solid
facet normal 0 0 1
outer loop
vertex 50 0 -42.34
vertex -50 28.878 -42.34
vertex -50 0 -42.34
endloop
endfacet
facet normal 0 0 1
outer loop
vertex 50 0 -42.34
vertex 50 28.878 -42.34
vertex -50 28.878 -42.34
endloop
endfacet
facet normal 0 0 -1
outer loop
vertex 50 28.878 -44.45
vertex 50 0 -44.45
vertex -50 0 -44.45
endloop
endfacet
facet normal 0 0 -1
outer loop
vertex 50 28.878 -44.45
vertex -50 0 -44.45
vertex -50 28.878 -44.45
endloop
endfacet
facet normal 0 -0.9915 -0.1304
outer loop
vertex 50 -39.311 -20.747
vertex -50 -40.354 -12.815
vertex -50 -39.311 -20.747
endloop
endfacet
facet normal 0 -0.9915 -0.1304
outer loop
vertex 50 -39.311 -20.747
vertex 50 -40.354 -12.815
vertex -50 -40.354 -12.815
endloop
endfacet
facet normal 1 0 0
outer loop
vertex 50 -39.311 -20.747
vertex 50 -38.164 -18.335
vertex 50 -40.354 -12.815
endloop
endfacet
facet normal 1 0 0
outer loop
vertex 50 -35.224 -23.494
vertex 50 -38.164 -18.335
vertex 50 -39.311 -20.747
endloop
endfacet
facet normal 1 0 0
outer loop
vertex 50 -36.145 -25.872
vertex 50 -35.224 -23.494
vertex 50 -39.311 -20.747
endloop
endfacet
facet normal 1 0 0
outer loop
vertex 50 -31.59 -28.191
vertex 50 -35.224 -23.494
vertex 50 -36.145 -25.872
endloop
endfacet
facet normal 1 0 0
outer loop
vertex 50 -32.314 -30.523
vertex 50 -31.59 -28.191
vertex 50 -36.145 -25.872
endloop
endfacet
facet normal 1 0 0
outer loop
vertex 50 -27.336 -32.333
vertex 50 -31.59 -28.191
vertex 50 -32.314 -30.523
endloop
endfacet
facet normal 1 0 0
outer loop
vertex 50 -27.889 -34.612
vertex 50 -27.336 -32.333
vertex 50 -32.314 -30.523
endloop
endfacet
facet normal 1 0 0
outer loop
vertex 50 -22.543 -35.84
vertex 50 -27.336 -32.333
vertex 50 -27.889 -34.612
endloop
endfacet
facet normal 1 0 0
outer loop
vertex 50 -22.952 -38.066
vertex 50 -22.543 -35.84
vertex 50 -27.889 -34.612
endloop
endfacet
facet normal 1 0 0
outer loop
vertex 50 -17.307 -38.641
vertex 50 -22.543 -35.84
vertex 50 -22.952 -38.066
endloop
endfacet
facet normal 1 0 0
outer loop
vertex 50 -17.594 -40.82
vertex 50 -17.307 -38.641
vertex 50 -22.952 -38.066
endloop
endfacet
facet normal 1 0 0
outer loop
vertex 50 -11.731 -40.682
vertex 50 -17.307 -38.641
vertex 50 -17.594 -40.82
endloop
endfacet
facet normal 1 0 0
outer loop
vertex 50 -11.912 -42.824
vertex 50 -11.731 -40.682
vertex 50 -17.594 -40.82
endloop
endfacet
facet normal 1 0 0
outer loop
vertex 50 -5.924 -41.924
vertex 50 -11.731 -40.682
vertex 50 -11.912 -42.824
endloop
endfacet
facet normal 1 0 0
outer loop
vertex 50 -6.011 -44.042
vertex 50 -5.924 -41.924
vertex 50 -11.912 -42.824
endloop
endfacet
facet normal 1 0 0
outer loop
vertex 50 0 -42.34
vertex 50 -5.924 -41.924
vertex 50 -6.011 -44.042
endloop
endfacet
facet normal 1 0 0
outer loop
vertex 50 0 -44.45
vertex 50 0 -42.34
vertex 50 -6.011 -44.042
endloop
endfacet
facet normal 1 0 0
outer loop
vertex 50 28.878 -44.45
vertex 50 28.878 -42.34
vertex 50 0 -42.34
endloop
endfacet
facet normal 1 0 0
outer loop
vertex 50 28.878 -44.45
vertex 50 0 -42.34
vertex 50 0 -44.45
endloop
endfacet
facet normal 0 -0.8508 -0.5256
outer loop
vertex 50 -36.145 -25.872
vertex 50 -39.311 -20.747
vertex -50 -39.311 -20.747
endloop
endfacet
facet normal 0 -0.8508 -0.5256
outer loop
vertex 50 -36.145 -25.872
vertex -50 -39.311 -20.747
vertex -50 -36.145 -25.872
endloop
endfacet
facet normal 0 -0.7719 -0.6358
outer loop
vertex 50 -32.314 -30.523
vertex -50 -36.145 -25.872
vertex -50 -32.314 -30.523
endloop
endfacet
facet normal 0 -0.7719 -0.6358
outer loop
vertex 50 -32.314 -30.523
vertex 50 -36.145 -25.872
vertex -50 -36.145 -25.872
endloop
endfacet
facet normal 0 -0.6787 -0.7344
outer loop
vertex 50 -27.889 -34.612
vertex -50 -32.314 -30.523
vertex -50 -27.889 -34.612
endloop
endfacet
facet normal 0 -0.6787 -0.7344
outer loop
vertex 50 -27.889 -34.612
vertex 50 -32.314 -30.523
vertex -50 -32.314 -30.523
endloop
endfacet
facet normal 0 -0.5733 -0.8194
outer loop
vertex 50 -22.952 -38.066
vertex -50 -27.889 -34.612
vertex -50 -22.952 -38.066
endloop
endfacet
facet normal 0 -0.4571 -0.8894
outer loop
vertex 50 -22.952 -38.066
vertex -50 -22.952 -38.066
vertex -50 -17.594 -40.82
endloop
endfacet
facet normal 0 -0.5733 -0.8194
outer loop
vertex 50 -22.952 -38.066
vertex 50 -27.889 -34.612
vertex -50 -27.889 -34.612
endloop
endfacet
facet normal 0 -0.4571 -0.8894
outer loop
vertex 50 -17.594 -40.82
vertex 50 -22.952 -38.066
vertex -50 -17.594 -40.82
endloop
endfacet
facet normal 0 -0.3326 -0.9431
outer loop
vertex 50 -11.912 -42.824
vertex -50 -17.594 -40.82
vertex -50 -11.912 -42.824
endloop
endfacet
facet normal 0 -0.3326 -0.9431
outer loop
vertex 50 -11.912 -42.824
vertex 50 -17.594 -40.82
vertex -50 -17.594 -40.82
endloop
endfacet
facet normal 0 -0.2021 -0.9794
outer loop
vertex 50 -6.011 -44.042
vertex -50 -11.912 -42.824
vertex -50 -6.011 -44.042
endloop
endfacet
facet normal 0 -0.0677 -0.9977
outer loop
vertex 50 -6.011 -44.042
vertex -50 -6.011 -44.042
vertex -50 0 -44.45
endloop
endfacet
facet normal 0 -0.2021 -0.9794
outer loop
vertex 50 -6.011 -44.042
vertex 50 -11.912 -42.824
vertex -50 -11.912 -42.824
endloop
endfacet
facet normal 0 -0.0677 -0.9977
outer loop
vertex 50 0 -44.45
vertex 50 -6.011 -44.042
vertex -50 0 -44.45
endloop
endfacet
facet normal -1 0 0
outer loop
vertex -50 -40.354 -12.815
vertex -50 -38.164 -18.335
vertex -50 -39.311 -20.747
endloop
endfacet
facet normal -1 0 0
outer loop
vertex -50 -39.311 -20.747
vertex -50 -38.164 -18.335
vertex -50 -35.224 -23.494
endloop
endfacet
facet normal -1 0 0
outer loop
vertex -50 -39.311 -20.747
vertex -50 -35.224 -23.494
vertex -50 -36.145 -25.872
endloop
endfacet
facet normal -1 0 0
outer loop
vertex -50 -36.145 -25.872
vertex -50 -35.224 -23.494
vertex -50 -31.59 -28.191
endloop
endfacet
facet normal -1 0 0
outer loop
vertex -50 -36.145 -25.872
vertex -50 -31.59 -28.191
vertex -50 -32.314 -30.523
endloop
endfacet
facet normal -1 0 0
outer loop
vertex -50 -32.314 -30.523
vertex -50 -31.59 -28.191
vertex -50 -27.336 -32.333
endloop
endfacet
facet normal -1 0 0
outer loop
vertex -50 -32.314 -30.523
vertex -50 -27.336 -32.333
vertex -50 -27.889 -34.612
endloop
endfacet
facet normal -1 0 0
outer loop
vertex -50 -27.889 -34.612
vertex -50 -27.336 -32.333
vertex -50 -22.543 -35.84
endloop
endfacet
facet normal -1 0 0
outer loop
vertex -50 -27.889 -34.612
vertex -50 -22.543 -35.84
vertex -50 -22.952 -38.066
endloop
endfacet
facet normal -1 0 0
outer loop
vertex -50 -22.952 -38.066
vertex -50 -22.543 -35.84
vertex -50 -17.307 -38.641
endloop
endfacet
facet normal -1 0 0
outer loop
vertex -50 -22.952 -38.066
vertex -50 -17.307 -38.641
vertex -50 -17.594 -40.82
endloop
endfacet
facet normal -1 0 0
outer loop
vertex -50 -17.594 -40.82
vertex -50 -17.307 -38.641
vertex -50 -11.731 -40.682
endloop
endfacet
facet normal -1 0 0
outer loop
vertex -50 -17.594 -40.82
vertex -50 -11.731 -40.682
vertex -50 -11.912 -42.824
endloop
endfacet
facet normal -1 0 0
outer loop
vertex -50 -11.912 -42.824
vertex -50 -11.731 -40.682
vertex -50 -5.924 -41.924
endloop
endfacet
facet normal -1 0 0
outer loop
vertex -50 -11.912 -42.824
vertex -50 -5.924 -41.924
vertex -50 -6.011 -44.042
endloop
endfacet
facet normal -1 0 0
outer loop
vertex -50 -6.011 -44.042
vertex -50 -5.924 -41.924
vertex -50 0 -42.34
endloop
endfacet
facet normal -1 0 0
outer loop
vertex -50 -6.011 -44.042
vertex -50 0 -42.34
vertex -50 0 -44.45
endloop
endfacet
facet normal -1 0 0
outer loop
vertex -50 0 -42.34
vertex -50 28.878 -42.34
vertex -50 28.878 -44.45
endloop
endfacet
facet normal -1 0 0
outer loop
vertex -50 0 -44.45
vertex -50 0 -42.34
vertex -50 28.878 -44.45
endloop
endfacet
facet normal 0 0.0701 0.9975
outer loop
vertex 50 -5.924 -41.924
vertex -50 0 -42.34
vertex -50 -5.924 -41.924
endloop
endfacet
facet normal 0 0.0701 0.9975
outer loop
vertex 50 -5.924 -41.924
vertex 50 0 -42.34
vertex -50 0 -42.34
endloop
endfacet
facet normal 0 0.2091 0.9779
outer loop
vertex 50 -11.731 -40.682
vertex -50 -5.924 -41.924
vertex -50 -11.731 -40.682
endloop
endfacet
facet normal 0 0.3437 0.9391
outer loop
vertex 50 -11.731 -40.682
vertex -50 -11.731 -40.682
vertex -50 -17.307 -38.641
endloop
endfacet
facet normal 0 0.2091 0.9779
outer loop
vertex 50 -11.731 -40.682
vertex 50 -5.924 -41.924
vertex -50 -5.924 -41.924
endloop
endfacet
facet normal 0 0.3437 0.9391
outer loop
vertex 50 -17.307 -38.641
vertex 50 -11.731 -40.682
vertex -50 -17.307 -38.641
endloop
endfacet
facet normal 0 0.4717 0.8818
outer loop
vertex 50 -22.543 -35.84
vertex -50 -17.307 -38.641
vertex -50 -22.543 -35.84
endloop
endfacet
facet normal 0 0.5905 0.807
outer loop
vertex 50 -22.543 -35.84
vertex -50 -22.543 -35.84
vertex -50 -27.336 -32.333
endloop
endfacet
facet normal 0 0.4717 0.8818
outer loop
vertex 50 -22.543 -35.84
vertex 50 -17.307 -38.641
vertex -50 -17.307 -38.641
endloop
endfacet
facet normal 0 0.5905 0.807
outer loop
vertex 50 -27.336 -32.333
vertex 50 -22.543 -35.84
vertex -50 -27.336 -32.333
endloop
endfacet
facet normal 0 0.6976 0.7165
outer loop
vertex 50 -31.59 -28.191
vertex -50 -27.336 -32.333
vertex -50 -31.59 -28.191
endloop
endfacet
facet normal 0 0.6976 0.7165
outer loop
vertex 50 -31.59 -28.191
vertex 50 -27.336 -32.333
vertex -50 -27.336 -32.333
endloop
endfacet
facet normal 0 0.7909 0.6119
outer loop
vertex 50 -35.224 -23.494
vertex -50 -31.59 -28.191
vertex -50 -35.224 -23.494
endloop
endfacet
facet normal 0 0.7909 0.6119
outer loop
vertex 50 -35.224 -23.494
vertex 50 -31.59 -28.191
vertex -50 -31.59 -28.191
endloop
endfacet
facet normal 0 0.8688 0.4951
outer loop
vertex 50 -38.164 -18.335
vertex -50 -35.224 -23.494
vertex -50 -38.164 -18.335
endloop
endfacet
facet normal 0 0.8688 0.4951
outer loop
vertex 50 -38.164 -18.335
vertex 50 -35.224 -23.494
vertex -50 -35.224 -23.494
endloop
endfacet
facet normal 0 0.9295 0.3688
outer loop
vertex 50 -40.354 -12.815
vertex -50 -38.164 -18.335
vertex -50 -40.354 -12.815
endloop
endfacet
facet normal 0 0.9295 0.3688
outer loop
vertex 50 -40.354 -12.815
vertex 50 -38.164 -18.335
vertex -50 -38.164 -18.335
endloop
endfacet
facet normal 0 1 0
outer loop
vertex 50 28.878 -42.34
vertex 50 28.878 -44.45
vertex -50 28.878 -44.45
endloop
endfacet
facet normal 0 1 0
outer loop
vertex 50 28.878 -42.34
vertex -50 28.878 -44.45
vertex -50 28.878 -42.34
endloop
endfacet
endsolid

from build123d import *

# Parameters (mm, degrees)
RESSALTO_EXTRUS_O1_DEPTH = 50


with BuildPart() as part:
    # Esboço1 → Ressalto-extrusão1 (new, symmetric)
    with BuildSketch(Plane(origin=(0, 0, 0), x_dir=(0, 0, -1), z_dir=(1, 0, 0))):
        with BuildLine():
            Line((12.814923667, -40.354099314), (20.74666802, -39.311299471))
            ThreePointArc((20.74666802, -39.311299471), (38.065679381, -22.952266843), (44.45, 0))
            Line((44.45, 0), (44.45, 28.878170812))
            Line((44.45, 28.878170812), (42.34, 28.878170812))
            Line((42.34, 28.878170812), (42.34, 0))
            ThreePointArc((42.34, 0), (34.170597508, -25.000917303), (12.814923667, -40.354099314))
        make_face()
    extrude(amount=RESSALTO_EXTRUS_O1_DEPTH, both=True)


solid = part.part
